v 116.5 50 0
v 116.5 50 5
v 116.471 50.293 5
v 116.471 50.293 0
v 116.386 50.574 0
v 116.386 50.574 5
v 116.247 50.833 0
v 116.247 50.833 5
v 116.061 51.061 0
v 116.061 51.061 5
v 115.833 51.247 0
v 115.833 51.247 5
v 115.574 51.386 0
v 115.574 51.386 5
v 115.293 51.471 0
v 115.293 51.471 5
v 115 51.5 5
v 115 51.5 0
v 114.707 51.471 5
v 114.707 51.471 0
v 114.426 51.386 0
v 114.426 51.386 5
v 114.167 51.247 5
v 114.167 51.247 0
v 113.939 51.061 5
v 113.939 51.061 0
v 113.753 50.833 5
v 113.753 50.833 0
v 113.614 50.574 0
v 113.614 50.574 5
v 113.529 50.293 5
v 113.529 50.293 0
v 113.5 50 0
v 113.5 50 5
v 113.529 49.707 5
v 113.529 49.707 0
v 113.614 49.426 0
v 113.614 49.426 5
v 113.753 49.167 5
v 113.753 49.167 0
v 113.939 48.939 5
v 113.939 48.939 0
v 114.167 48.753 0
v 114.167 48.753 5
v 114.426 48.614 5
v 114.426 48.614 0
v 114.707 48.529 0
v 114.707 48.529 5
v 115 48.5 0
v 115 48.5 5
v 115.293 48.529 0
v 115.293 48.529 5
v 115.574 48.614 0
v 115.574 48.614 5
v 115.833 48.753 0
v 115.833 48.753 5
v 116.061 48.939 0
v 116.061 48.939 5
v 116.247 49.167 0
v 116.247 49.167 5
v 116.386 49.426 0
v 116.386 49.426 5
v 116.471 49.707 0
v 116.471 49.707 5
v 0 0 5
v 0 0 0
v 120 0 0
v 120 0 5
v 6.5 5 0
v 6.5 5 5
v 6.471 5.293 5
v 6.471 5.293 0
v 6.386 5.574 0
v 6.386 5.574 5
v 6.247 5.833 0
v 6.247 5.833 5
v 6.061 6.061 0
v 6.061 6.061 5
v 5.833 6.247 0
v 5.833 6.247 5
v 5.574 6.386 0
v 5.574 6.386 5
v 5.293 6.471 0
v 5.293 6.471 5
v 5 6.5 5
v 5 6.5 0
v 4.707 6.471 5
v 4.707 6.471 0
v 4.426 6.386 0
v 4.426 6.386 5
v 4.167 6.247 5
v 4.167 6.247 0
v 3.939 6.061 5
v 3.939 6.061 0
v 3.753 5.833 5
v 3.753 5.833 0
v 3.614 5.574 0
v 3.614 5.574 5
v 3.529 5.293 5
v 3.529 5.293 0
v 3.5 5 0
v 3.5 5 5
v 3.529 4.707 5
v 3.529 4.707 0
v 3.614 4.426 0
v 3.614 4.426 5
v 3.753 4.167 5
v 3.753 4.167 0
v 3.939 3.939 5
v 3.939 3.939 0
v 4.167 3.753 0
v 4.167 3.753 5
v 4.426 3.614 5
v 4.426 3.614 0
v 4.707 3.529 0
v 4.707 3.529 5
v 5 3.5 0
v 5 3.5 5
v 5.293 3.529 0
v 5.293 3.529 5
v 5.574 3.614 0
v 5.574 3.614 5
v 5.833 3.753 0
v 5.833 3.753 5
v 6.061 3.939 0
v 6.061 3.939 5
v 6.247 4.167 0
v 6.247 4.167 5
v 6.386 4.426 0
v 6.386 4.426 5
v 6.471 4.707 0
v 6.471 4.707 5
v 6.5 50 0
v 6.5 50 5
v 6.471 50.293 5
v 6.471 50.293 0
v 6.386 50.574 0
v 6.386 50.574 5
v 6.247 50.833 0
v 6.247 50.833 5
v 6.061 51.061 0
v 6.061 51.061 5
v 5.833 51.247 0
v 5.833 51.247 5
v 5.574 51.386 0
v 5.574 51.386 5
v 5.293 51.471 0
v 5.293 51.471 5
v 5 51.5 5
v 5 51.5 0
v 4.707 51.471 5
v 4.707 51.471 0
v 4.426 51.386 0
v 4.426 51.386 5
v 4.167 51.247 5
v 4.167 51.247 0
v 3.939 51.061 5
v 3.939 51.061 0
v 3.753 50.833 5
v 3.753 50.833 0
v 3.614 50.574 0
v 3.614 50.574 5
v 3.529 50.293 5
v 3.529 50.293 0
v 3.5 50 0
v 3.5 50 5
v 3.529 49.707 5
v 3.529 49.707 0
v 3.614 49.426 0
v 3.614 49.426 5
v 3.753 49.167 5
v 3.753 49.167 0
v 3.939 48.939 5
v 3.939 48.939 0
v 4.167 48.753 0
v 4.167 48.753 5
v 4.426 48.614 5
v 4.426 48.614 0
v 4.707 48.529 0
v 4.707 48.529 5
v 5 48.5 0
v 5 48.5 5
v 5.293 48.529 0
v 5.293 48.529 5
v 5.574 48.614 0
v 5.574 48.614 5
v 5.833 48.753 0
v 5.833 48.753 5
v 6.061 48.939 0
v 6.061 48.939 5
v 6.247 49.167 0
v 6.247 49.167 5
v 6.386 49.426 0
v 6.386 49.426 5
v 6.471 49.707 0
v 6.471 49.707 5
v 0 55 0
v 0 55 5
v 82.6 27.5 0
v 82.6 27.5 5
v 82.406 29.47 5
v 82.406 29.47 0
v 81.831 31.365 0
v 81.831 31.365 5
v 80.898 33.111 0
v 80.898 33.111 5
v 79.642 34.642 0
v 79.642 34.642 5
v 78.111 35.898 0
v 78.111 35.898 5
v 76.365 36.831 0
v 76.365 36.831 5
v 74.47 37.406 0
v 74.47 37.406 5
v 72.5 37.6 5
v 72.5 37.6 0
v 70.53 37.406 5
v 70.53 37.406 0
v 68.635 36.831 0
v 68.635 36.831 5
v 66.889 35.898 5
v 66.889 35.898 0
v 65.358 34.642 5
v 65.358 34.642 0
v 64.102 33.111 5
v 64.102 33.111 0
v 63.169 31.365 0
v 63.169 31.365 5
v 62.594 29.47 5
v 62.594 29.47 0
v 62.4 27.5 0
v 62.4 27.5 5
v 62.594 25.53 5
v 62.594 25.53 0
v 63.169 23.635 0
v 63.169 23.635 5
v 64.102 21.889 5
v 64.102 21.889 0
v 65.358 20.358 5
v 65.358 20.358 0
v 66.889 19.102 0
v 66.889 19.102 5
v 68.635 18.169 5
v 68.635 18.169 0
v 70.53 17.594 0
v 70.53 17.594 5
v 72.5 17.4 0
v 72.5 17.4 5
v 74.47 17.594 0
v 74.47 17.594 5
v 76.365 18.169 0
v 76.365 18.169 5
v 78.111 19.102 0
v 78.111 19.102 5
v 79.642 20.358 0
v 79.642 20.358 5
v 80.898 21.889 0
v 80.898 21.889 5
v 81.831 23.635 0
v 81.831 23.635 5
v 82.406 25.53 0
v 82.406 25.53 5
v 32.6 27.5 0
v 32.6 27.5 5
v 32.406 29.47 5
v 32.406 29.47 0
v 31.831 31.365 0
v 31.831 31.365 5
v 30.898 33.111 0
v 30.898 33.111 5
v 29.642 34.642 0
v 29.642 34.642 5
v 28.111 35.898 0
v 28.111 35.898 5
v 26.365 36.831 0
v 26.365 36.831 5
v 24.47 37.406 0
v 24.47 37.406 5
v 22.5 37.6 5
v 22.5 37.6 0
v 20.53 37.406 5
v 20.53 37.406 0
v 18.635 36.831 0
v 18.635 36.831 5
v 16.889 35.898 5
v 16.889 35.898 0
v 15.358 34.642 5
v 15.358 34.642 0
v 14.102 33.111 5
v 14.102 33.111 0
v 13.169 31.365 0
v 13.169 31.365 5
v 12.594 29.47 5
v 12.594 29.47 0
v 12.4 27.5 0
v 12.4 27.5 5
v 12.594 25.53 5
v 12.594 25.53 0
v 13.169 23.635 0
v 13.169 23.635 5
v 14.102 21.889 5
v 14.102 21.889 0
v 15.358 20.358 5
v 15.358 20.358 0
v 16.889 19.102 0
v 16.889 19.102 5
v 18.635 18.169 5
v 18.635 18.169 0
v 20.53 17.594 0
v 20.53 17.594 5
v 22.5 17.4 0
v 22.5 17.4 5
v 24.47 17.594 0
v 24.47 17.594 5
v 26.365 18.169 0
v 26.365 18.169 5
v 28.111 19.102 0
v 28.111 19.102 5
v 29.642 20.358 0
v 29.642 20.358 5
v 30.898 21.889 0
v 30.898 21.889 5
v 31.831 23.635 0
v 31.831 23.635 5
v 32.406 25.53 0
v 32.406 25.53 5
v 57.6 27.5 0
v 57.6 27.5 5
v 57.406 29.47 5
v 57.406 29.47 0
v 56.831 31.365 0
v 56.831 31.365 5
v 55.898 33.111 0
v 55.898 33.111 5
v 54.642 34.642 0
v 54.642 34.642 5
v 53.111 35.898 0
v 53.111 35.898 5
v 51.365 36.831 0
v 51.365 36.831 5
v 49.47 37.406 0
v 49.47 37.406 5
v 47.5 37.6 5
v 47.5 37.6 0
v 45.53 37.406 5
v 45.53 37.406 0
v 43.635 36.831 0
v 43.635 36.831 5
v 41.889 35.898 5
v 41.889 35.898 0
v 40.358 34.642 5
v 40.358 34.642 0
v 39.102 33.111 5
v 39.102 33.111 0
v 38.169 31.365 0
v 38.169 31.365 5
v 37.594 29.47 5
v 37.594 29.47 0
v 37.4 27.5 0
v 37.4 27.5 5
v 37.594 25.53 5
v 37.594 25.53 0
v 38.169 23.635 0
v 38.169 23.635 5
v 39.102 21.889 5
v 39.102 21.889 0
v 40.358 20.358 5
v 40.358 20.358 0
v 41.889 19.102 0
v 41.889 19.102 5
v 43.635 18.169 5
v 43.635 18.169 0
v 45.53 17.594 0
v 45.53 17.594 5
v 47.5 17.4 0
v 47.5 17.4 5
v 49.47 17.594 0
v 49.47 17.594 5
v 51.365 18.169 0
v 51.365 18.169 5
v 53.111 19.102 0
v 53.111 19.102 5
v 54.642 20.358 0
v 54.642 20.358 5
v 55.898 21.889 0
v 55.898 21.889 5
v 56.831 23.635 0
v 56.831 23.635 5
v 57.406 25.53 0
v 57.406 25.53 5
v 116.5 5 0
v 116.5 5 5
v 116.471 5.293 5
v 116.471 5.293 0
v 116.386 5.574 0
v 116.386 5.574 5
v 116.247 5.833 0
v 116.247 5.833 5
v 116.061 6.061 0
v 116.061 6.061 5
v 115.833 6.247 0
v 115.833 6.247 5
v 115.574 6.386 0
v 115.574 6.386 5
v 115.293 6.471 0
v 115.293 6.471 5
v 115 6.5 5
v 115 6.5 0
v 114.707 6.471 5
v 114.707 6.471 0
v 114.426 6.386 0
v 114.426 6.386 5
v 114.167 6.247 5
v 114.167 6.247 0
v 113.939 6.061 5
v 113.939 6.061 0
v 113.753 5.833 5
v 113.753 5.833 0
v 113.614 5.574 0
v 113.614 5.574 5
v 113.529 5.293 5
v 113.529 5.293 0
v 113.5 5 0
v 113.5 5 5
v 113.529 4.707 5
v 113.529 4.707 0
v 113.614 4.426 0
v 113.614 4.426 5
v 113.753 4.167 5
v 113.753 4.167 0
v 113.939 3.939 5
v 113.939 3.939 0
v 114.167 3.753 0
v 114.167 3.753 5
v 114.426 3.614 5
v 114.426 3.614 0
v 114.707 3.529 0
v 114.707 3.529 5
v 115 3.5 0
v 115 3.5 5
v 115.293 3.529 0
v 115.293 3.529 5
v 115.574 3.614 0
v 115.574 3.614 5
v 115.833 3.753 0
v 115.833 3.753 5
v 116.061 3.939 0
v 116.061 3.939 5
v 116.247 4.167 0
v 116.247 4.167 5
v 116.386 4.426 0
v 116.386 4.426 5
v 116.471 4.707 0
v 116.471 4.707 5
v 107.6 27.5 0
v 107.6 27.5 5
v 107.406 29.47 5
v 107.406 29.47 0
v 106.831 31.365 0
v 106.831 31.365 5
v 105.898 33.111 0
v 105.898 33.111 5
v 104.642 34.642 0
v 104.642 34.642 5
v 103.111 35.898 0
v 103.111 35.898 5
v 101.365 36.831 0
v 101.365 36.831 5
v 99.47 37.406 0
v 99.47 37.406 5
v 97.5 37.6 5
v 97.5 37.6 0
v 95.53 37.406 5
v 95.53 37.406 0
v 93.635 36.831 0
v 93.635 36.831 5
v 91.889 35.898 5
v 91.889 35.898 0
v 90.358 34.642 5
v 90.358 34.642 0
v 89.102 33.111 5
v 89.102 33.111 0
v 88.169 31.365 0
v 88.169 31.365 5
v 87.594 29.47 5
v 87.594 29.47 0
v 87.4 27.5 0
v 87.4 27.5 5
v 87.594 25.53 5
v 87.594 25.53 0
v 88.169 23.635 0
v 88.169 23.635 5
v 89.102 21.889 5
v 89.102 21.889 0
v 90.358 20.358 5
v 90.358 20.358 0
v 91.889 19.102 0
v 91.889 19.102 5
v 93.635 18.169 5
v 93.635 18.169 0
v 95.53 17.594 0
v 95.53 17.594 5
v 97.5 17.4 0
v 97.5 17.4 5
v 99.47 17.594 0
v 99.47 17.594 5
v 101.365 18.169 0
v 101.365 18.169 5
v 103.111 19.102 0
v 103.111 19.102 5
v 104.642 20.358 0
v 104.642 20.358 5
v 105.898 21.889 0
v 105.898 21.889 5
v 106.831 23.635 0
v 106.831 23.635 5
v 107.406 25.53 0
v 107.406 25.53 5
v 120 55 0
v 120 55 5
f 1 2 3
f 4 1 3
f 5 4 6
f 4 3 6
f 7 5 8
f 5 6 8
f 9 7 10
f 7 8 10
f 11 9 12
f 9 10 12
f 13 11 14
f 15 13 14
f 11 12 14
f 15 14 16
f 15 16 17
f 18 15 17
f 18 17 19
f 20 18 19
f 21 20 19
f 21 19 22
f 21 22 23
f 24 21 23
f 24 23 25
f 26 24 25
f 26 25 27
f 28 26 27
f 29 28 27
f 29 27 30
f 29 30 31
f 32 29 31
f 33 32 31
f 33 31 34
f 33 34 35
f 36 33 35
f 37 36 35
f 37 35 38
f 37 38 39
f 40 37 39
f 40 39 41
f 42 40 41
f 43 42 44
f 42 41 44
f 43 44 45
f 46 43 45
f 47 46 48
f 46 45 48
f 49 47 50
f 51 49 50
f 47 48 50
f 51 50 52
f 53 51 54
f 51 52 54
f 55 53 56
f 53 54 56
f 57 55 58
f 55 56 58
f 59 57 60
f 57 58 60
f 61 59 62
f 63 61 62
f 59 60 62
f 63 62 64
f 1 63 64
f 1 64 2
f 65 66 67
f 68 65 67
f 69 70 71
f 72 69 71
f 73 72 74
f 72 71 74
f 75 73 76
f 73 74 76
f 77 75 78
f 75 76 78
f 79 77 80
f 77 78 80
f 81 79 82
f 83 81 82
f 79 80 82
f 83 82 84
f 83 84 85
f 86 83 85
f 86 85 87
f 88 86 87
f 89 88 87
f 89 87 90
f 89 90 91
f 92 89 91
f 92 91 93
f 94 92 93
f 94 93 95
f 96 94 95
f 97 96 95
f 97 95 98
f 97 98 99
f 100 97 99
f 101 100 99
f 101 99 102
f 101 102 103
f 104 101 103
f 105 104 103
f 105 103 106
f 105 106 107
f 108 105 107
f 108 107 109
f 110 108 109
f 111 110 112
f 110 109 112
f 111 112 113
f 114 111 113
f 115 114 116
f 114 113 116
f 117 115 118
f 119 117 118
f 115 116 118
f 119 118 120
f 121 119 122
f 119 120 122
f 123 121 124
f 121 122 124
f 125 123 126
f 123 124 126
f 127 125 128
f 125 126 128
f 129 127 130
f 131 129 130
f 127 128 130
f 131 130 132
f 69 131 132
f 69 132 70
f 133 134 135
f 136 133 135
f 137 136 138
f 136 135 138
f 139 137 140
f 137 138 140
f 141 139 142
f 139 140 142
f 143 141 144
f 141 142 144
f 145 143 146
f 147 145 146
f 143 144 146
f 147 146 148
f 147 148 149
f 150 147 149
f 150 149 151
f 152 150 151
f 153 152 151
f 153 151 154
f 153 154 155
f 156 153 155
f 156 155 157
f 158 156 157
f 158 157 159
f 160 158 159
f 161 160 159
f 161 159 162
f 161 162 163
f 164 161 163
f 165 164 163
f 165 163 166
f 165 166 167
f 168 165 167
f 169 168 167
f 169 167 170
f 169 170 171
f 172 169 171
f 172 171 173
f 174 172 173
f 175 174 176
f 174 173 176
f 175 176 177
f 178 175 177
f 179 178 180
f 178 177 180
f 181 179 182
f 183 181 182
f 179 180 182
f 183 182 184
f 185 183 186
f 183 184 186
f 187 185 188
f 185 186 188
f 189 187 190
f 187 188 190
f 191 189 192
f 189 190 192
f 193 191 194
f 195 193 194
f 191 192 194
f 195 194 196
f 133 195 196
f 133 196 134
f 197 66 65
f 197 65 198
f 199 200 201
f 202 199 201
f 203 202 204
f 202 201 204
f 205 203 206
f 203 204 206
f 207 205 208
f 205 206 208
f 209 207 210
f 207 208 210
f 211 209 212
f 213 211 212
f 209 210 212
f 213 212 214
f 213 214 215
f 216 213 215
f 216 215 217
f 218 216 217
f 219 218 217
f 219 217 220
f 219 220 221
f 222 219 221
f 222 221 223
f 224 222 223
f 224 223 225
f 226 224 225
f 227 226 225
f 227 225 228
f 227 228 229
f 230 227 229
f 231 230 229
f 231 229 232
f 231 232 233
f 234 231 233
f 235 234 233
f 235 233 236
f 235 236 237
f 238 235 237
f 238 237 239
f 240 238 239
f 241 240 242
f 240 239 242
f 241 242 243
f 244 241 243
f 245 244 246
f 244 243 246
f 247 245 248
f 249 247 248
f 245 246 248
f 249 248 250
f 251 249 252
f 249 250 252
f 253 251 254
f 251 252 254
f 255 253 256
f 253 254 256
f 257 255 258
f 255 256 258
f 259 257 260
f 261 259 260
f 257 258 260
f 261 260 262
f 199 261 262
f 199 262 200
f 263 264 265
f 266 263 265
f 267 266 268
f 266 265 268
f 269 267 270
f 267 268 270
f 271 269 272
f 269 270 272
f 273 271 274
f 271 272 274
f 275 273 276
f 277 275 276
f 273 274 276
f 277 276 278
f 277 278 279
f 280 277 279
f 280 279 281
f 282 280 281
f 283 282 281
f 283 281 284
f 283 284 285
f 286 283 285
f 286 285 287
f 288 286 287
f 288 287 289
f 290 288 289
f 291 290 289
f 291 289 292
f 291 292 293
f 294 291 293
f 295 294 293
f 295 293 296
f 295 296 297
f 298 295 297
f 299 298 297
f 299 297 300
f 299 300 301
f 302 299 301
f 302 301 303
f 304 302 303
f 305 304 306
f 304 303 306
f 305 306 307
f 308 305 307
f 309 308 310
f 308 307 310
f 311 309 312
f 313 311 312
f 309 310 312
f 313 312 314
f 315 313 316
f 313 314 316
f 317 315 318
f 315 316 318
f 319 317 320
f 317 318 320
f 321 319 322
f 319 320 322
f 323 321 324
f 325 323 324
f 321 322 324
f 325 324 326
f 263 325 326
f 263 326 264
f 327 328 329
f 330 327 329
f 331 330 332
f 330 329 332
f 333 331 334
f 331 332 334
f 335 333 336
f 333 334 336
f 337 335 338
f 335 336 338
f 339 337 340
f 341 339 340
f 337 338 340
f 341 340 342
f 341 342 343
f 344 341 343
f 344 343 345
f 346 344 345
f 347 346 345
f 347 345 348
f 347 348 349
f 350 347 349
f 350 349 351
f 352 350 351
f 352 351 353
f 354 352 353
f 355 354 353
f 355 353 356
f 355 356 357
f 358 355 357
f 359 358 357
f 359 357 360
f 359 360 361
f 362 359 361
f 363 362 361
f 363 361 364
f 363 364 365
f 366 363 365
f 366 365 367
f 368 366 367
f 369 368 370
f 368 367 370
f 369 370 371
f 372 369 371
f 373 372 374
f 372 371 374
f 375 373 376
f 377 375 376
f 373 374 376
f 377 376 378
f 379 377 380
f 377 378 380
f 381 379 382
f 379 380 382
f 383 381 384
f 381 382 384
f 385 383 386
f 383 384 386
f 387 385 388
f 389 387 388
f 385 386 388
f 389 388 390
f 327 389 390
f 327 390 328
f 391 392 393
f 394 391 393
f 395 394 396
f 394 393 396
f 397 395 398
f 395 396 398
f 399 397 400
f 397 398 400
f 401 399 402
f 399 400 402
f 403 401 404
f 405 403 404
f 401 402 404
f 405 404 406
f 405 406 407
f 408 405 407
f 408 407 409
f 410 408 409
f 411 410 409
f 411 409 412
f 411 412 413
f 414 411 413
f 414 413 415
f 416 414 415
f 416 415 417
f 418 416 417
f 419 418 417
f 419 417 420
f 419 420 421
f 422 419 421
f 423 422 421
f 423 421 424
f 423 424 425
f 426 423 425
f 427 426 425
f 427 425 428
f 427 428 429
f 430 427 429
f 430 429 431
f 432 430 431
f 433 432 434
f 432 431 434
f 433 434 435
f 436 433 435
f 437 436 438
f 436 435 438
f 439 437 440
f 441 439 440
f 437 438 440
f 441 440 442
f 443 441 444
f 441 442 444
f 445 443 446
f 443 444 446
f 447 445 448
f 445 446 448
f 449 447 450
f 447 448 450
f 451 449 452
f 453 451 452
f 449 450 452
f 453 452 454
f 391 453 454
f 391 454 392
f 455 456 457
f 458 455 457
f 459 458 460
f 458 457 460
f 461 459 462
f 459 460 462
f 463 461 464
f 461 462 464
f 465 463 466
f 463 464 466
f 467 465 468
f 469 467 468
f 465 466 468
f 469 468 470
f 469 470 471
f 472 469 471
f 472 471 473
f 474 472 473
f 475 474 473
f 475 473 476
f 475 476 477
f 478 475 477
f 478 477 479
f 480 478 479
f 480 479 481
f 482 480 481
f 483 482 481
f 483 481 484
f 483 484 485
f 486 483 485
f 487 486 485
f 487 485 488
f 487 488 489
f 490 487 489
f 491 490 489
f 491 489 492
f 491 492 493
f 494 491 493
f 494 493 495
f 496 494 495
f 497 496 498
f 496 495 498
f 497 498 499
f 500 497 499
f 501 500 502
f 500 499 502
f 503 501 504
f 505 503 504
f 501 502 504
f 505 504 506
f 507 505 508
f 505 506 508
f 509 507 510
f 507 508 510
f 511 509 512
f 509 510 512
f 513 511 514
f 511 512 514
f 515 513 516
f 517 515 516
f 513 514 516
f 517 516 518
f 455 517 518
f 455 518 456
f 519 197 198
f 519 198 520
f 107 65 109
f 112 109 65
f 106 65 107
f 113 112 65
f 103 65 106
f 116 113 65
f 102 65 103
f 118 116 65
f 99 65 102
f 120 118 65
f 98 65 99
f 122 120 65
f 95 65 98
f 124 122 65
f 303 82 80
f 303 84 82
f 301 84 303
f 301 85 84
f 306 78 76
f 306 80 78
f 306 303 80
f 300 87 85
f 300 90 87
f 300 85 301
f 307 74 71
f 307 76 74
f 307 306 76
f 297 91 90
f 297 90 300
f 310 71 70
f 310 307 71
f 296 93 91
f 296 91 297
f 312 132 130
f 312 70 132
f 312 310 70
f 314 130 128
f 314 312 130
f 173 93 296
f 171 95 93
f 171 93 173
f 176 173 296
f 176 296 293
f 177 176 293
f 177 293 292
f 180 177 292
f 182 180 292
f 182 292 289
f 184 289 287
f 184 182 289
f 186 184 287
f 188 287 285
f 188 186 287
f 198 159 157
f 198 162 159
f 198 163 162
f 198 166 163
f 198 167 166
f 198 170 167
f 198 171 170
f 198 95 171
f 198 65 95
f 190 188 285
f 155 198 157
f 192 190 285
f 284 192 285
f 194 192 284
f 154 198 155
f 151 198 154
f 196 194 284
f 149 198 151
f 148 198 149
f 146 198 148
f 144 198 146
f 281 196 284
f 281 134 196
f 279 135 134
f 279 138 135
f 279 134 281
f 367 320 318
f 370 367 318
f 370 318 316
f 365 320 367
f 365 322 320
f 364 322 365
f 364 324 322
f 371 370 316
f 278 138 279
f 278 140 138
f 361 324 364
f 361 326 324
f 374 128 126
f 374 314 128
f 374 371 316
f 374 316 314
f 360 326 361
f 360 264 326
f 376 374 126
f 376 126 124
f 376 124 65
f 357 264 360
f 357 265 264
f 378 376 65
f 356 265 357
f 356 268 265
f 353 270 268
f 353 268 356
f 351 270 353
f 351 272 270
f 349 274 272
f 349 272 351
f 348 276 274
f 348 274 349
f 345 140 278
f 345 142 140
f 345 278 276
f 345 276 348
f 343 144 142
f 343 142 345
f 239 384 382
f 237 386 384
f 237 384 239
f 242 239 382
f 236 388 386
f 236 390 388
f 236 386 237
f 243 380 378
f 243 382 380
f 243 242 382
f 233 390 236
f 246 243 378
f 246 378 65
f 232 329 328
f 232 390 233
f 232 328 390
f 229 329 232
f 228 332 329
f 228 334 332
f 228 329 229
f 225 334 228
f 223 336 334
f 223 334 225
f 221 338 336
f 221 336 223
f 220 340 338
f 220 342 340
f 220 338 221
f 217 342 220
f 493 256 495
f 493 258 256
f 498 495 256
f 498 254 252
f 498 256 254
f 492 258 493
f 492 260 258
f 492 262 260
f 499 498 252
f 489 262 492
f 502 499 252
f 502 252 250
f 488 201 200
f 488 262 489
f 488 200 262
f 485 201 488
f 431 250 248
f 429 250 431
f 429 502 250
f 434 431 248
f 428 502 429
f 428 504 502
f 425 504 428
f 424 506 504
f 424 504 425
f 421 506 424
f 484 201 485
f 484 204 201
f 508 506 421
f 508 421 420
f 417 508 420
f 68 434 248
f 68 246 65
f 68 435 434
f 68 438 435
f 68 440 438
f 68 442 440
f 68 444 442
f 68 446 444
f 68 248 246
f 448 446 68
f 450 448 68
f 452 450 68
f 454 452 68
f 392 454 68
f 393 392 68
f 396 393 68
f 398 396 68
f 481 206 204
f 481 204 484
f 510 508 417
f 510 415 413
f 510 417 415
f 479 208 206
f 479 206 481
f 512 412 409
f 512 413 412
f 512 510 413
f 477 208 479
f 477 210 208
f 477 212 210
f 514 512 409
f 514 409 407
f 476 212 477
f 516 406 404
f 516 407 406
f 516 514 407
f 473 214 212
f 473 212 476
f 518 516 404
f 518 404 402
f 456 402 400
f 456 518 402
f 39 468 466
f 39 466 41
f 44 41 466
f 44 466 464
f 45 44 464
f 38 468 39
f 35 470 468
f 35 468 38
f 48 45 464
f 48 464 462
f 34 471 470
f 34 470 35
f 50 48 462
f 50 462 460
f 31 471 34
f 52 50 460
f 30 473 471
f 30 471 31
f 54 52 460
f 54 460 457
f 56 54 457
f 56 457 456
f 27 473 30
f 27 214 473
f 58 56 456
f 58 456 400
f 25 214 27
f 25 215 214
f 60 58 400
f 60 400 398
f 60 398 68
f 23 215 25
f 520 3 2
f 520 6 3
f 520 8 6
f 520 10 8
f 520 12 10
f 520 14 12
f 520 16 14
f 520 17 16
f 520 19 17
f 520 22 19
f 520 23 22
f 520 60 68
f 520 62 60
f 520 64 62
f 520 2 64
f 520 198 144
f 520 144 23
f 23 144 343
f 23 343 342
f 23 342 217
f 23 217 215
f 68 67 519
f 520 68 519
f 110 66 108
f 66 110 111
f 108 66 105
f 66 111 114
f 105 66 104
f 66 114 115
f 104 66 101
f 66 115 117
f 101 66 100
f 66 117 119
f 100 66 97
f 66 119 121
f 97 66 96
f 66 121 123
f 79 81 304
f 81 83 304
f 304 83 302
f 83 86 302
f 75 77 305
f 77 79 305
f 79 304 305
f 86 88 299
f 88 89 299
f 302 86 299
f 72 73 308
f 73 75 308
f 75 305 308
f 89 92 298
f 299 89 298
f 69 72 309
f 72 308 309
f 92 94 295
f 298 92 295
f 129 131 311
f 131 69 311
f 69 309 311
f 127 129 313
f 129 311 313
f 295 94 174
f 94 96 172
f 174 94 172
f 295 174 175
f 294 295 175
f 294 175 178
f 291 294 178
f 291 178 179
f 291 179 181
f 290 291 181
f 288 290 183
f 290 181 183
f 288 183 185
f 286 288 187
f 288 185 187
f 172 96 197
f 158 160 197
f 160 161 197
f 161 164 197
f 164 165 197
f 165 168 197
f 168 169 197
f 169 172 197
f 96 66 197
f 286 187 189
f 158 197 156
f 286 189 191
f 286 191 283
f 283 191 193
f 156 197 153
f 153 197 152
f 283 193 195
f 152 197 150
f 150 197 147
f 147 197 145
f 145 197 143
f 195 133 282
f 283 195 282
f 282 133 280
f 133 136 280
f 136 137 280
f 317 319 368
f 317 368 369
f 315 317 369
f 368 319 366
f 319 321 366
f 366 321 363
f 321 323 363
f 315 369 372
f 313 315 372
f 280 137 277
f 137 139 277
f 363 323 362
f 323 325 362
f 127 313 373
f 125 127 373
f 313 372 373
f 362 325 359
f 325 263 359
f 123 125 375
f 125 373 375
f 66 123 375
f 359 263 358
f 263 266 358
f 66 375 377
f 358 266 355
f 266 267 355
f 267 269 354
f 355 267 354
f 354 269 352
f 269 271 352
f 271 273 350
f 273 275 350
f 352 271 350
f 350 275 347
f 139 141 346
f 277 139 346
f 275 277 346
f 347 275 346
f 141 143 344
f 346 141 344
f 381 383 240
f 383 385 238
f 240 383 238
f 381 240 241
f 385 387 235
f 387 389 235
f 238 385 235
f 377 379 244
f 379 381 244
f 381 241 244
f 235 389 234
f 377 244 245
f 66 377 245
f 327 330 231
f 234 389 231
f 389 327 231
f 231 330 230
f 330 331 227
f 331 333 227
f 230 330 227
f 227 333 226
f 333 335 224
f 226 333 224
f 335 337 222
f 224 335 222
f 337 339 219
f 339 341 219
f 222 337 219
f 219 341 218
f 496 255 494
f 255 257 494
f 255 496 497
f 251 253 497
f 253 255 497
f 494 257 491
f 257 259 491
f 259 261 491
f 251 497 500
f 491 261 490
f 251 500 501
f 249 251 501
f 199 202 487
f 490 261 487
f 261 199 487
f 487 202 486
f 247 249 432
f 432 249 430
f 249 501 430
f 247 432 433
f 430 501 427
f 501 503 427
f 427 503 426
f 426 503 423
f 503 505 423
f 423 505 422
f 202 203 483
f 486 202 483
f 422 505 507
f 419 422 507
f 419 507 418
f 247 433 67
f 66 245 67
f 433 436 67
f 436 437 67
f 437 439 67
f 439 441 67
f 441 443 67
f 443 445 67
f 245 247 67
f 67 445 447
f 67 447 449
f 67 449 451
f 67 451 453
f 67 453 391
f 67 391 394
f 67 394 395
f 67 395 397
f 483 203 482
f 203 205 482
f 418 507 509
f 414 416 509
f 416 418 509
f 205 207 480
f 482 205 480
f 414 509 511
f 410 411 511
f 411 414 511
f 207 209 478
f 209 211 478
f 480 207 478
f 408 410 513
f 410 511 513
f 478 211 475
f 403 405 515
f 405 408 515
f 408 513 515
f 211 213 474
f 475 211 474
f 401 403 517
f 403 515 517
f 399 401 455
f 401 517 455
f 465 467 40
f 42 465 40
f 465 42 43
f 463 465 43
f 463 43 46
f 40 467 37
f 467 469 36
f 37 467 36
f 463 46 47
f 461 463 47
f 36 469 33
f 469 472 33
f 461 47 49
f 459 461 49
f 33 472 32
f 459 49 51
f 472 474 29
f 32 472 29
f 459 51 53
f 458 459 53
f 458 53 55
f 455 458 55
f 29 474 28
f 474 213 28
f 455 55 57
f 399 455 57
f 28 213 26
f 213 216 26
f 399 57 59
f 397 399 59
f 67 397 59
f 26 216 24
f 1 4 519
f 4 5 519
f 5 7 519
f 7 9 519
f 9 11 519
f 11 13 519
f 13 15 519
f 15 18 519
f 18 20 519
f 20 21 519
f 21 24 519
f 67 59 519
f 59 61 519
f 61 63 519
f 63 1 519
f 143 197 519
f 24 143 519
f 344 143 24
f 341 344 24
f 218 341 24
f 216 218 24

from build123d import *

# Parameters (mm, degrees)
F0_W     = 120
F0_H     = 55
F1_DEPTH = 5
F2_R     = 10.1
F3_DEPTH = 5.001
F4_R     = 1.5
F5_DEPTH = 5.001


with BuildPart() as f1:
    # F0 (on Top) → F1 (new body)
    with BuildSketch(Plane.XY):
        with Locations((60, 27.5)):
            Rectangle(F0_W, F0_H)
    extrude(amount=F1_DEPTH)

    # F2 (on face) → F3 (cut, through all)
    with BuildSketch(Plane.XY.offset(5)):
        with Locations((22.5, 27.5)):
            Circle(F2_R)
        with Locations((47.5, 27.5)):
            Circle(F2_R)
        with Locations((72.5, 27.5)):
            Circle(F2_R)
        with Locations((97.5, 27.5)):
            Circle(F2_R)
    extrude(amount=-F3_DEPTH, mode=Mode.SUBTRACT)

    # F4 (on face) → F5 (cut, through all)
    with BuildSketch(Plane.XY.offset(5)):
        with Locations((5, 50)):
            Circle(F4_R)
        with Locations((115, 50)):
            Circle(F4_R)
        with Locations((115, 5)):
            Circle(F4_R)
        with Locations((5, 5)):
            Circle(F4_R)
    extrude(amount=-F5_DEPTH, mode=Mode.SUBTRACT)


solid = f1.part
